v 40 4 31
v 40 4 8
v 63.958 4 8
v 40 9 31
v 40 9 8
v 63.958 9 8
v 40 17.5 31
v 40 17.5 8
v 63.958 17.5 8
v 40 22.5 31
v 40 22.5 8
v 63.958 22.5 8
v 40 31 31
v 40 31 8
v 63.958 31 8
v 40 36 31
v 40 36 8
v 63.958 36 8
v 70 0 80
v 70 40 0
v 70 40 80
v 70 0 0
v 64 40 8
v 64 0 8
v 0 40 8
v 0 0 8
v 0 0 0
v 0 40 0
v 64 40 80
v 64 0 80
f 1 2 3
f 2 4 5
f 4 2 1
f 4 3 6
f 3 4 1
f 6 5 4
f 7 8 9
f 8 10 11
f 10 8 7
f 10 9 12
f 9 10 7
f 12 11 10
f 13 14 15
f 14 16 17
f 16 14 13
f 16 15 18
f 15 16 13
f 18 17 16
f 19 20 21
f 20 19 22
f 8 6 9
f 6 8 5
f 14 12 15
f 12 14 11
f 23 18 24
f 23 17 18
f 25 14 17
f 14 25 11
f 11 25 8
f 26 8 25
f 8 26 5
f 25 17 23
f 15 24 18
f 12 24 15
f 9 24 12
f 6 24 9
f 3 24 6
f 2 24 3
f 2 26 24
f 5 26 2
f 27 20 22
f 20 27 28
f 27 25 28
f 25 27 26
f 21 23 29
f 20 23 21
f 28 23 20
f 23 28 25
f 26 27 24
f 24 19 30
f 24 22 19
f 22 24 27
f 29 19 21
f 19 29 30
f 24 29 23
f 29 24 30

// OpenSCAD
$fn = 32;

// ----------------------------------------------------------------------
// Rib bracket: 3-gusset L bracket
// ----------------------------------------------------------------------

// --- parameters (mm) ---
base_l = 70;              // foot length, X
base_w = 40;              // foot width, Y
base_t = 8;               // foot thickness
plate_t = 6;              // upright plate thickness
plate_h = 80;             // overall height
gus_l = 24;               // gusset leg along the foot
gus_h = 24;               // gusset height
gus_t = 5;                // gusset thickness
gus_edge = 4;             // gusset margin from the foot edge
n_gus = 3;                // gusset count

gus_pitch = (base_w - 2 * gus_edge - gus_t) / (n_gus - 1);  // gusset pitch

union() {
  cube([base_l, base_w, base_t]);
  translate([base_l - plate_t, 0, base_t - 1])
    cube([plate_t, base_w, plate_h - base_t + 1]);
  for (i = [0 : n_gus - 1])
    translate([base_l - plate_t - gus_l, gus_edge + i * gus_pitch, base_t - 1])
      rotate([-90, 0, 0])
        linear_extrude(height = gus_t)
          polygon(points = [[0, 0], [gus_l + 1, 0], [0, -gus_h]]);
}
